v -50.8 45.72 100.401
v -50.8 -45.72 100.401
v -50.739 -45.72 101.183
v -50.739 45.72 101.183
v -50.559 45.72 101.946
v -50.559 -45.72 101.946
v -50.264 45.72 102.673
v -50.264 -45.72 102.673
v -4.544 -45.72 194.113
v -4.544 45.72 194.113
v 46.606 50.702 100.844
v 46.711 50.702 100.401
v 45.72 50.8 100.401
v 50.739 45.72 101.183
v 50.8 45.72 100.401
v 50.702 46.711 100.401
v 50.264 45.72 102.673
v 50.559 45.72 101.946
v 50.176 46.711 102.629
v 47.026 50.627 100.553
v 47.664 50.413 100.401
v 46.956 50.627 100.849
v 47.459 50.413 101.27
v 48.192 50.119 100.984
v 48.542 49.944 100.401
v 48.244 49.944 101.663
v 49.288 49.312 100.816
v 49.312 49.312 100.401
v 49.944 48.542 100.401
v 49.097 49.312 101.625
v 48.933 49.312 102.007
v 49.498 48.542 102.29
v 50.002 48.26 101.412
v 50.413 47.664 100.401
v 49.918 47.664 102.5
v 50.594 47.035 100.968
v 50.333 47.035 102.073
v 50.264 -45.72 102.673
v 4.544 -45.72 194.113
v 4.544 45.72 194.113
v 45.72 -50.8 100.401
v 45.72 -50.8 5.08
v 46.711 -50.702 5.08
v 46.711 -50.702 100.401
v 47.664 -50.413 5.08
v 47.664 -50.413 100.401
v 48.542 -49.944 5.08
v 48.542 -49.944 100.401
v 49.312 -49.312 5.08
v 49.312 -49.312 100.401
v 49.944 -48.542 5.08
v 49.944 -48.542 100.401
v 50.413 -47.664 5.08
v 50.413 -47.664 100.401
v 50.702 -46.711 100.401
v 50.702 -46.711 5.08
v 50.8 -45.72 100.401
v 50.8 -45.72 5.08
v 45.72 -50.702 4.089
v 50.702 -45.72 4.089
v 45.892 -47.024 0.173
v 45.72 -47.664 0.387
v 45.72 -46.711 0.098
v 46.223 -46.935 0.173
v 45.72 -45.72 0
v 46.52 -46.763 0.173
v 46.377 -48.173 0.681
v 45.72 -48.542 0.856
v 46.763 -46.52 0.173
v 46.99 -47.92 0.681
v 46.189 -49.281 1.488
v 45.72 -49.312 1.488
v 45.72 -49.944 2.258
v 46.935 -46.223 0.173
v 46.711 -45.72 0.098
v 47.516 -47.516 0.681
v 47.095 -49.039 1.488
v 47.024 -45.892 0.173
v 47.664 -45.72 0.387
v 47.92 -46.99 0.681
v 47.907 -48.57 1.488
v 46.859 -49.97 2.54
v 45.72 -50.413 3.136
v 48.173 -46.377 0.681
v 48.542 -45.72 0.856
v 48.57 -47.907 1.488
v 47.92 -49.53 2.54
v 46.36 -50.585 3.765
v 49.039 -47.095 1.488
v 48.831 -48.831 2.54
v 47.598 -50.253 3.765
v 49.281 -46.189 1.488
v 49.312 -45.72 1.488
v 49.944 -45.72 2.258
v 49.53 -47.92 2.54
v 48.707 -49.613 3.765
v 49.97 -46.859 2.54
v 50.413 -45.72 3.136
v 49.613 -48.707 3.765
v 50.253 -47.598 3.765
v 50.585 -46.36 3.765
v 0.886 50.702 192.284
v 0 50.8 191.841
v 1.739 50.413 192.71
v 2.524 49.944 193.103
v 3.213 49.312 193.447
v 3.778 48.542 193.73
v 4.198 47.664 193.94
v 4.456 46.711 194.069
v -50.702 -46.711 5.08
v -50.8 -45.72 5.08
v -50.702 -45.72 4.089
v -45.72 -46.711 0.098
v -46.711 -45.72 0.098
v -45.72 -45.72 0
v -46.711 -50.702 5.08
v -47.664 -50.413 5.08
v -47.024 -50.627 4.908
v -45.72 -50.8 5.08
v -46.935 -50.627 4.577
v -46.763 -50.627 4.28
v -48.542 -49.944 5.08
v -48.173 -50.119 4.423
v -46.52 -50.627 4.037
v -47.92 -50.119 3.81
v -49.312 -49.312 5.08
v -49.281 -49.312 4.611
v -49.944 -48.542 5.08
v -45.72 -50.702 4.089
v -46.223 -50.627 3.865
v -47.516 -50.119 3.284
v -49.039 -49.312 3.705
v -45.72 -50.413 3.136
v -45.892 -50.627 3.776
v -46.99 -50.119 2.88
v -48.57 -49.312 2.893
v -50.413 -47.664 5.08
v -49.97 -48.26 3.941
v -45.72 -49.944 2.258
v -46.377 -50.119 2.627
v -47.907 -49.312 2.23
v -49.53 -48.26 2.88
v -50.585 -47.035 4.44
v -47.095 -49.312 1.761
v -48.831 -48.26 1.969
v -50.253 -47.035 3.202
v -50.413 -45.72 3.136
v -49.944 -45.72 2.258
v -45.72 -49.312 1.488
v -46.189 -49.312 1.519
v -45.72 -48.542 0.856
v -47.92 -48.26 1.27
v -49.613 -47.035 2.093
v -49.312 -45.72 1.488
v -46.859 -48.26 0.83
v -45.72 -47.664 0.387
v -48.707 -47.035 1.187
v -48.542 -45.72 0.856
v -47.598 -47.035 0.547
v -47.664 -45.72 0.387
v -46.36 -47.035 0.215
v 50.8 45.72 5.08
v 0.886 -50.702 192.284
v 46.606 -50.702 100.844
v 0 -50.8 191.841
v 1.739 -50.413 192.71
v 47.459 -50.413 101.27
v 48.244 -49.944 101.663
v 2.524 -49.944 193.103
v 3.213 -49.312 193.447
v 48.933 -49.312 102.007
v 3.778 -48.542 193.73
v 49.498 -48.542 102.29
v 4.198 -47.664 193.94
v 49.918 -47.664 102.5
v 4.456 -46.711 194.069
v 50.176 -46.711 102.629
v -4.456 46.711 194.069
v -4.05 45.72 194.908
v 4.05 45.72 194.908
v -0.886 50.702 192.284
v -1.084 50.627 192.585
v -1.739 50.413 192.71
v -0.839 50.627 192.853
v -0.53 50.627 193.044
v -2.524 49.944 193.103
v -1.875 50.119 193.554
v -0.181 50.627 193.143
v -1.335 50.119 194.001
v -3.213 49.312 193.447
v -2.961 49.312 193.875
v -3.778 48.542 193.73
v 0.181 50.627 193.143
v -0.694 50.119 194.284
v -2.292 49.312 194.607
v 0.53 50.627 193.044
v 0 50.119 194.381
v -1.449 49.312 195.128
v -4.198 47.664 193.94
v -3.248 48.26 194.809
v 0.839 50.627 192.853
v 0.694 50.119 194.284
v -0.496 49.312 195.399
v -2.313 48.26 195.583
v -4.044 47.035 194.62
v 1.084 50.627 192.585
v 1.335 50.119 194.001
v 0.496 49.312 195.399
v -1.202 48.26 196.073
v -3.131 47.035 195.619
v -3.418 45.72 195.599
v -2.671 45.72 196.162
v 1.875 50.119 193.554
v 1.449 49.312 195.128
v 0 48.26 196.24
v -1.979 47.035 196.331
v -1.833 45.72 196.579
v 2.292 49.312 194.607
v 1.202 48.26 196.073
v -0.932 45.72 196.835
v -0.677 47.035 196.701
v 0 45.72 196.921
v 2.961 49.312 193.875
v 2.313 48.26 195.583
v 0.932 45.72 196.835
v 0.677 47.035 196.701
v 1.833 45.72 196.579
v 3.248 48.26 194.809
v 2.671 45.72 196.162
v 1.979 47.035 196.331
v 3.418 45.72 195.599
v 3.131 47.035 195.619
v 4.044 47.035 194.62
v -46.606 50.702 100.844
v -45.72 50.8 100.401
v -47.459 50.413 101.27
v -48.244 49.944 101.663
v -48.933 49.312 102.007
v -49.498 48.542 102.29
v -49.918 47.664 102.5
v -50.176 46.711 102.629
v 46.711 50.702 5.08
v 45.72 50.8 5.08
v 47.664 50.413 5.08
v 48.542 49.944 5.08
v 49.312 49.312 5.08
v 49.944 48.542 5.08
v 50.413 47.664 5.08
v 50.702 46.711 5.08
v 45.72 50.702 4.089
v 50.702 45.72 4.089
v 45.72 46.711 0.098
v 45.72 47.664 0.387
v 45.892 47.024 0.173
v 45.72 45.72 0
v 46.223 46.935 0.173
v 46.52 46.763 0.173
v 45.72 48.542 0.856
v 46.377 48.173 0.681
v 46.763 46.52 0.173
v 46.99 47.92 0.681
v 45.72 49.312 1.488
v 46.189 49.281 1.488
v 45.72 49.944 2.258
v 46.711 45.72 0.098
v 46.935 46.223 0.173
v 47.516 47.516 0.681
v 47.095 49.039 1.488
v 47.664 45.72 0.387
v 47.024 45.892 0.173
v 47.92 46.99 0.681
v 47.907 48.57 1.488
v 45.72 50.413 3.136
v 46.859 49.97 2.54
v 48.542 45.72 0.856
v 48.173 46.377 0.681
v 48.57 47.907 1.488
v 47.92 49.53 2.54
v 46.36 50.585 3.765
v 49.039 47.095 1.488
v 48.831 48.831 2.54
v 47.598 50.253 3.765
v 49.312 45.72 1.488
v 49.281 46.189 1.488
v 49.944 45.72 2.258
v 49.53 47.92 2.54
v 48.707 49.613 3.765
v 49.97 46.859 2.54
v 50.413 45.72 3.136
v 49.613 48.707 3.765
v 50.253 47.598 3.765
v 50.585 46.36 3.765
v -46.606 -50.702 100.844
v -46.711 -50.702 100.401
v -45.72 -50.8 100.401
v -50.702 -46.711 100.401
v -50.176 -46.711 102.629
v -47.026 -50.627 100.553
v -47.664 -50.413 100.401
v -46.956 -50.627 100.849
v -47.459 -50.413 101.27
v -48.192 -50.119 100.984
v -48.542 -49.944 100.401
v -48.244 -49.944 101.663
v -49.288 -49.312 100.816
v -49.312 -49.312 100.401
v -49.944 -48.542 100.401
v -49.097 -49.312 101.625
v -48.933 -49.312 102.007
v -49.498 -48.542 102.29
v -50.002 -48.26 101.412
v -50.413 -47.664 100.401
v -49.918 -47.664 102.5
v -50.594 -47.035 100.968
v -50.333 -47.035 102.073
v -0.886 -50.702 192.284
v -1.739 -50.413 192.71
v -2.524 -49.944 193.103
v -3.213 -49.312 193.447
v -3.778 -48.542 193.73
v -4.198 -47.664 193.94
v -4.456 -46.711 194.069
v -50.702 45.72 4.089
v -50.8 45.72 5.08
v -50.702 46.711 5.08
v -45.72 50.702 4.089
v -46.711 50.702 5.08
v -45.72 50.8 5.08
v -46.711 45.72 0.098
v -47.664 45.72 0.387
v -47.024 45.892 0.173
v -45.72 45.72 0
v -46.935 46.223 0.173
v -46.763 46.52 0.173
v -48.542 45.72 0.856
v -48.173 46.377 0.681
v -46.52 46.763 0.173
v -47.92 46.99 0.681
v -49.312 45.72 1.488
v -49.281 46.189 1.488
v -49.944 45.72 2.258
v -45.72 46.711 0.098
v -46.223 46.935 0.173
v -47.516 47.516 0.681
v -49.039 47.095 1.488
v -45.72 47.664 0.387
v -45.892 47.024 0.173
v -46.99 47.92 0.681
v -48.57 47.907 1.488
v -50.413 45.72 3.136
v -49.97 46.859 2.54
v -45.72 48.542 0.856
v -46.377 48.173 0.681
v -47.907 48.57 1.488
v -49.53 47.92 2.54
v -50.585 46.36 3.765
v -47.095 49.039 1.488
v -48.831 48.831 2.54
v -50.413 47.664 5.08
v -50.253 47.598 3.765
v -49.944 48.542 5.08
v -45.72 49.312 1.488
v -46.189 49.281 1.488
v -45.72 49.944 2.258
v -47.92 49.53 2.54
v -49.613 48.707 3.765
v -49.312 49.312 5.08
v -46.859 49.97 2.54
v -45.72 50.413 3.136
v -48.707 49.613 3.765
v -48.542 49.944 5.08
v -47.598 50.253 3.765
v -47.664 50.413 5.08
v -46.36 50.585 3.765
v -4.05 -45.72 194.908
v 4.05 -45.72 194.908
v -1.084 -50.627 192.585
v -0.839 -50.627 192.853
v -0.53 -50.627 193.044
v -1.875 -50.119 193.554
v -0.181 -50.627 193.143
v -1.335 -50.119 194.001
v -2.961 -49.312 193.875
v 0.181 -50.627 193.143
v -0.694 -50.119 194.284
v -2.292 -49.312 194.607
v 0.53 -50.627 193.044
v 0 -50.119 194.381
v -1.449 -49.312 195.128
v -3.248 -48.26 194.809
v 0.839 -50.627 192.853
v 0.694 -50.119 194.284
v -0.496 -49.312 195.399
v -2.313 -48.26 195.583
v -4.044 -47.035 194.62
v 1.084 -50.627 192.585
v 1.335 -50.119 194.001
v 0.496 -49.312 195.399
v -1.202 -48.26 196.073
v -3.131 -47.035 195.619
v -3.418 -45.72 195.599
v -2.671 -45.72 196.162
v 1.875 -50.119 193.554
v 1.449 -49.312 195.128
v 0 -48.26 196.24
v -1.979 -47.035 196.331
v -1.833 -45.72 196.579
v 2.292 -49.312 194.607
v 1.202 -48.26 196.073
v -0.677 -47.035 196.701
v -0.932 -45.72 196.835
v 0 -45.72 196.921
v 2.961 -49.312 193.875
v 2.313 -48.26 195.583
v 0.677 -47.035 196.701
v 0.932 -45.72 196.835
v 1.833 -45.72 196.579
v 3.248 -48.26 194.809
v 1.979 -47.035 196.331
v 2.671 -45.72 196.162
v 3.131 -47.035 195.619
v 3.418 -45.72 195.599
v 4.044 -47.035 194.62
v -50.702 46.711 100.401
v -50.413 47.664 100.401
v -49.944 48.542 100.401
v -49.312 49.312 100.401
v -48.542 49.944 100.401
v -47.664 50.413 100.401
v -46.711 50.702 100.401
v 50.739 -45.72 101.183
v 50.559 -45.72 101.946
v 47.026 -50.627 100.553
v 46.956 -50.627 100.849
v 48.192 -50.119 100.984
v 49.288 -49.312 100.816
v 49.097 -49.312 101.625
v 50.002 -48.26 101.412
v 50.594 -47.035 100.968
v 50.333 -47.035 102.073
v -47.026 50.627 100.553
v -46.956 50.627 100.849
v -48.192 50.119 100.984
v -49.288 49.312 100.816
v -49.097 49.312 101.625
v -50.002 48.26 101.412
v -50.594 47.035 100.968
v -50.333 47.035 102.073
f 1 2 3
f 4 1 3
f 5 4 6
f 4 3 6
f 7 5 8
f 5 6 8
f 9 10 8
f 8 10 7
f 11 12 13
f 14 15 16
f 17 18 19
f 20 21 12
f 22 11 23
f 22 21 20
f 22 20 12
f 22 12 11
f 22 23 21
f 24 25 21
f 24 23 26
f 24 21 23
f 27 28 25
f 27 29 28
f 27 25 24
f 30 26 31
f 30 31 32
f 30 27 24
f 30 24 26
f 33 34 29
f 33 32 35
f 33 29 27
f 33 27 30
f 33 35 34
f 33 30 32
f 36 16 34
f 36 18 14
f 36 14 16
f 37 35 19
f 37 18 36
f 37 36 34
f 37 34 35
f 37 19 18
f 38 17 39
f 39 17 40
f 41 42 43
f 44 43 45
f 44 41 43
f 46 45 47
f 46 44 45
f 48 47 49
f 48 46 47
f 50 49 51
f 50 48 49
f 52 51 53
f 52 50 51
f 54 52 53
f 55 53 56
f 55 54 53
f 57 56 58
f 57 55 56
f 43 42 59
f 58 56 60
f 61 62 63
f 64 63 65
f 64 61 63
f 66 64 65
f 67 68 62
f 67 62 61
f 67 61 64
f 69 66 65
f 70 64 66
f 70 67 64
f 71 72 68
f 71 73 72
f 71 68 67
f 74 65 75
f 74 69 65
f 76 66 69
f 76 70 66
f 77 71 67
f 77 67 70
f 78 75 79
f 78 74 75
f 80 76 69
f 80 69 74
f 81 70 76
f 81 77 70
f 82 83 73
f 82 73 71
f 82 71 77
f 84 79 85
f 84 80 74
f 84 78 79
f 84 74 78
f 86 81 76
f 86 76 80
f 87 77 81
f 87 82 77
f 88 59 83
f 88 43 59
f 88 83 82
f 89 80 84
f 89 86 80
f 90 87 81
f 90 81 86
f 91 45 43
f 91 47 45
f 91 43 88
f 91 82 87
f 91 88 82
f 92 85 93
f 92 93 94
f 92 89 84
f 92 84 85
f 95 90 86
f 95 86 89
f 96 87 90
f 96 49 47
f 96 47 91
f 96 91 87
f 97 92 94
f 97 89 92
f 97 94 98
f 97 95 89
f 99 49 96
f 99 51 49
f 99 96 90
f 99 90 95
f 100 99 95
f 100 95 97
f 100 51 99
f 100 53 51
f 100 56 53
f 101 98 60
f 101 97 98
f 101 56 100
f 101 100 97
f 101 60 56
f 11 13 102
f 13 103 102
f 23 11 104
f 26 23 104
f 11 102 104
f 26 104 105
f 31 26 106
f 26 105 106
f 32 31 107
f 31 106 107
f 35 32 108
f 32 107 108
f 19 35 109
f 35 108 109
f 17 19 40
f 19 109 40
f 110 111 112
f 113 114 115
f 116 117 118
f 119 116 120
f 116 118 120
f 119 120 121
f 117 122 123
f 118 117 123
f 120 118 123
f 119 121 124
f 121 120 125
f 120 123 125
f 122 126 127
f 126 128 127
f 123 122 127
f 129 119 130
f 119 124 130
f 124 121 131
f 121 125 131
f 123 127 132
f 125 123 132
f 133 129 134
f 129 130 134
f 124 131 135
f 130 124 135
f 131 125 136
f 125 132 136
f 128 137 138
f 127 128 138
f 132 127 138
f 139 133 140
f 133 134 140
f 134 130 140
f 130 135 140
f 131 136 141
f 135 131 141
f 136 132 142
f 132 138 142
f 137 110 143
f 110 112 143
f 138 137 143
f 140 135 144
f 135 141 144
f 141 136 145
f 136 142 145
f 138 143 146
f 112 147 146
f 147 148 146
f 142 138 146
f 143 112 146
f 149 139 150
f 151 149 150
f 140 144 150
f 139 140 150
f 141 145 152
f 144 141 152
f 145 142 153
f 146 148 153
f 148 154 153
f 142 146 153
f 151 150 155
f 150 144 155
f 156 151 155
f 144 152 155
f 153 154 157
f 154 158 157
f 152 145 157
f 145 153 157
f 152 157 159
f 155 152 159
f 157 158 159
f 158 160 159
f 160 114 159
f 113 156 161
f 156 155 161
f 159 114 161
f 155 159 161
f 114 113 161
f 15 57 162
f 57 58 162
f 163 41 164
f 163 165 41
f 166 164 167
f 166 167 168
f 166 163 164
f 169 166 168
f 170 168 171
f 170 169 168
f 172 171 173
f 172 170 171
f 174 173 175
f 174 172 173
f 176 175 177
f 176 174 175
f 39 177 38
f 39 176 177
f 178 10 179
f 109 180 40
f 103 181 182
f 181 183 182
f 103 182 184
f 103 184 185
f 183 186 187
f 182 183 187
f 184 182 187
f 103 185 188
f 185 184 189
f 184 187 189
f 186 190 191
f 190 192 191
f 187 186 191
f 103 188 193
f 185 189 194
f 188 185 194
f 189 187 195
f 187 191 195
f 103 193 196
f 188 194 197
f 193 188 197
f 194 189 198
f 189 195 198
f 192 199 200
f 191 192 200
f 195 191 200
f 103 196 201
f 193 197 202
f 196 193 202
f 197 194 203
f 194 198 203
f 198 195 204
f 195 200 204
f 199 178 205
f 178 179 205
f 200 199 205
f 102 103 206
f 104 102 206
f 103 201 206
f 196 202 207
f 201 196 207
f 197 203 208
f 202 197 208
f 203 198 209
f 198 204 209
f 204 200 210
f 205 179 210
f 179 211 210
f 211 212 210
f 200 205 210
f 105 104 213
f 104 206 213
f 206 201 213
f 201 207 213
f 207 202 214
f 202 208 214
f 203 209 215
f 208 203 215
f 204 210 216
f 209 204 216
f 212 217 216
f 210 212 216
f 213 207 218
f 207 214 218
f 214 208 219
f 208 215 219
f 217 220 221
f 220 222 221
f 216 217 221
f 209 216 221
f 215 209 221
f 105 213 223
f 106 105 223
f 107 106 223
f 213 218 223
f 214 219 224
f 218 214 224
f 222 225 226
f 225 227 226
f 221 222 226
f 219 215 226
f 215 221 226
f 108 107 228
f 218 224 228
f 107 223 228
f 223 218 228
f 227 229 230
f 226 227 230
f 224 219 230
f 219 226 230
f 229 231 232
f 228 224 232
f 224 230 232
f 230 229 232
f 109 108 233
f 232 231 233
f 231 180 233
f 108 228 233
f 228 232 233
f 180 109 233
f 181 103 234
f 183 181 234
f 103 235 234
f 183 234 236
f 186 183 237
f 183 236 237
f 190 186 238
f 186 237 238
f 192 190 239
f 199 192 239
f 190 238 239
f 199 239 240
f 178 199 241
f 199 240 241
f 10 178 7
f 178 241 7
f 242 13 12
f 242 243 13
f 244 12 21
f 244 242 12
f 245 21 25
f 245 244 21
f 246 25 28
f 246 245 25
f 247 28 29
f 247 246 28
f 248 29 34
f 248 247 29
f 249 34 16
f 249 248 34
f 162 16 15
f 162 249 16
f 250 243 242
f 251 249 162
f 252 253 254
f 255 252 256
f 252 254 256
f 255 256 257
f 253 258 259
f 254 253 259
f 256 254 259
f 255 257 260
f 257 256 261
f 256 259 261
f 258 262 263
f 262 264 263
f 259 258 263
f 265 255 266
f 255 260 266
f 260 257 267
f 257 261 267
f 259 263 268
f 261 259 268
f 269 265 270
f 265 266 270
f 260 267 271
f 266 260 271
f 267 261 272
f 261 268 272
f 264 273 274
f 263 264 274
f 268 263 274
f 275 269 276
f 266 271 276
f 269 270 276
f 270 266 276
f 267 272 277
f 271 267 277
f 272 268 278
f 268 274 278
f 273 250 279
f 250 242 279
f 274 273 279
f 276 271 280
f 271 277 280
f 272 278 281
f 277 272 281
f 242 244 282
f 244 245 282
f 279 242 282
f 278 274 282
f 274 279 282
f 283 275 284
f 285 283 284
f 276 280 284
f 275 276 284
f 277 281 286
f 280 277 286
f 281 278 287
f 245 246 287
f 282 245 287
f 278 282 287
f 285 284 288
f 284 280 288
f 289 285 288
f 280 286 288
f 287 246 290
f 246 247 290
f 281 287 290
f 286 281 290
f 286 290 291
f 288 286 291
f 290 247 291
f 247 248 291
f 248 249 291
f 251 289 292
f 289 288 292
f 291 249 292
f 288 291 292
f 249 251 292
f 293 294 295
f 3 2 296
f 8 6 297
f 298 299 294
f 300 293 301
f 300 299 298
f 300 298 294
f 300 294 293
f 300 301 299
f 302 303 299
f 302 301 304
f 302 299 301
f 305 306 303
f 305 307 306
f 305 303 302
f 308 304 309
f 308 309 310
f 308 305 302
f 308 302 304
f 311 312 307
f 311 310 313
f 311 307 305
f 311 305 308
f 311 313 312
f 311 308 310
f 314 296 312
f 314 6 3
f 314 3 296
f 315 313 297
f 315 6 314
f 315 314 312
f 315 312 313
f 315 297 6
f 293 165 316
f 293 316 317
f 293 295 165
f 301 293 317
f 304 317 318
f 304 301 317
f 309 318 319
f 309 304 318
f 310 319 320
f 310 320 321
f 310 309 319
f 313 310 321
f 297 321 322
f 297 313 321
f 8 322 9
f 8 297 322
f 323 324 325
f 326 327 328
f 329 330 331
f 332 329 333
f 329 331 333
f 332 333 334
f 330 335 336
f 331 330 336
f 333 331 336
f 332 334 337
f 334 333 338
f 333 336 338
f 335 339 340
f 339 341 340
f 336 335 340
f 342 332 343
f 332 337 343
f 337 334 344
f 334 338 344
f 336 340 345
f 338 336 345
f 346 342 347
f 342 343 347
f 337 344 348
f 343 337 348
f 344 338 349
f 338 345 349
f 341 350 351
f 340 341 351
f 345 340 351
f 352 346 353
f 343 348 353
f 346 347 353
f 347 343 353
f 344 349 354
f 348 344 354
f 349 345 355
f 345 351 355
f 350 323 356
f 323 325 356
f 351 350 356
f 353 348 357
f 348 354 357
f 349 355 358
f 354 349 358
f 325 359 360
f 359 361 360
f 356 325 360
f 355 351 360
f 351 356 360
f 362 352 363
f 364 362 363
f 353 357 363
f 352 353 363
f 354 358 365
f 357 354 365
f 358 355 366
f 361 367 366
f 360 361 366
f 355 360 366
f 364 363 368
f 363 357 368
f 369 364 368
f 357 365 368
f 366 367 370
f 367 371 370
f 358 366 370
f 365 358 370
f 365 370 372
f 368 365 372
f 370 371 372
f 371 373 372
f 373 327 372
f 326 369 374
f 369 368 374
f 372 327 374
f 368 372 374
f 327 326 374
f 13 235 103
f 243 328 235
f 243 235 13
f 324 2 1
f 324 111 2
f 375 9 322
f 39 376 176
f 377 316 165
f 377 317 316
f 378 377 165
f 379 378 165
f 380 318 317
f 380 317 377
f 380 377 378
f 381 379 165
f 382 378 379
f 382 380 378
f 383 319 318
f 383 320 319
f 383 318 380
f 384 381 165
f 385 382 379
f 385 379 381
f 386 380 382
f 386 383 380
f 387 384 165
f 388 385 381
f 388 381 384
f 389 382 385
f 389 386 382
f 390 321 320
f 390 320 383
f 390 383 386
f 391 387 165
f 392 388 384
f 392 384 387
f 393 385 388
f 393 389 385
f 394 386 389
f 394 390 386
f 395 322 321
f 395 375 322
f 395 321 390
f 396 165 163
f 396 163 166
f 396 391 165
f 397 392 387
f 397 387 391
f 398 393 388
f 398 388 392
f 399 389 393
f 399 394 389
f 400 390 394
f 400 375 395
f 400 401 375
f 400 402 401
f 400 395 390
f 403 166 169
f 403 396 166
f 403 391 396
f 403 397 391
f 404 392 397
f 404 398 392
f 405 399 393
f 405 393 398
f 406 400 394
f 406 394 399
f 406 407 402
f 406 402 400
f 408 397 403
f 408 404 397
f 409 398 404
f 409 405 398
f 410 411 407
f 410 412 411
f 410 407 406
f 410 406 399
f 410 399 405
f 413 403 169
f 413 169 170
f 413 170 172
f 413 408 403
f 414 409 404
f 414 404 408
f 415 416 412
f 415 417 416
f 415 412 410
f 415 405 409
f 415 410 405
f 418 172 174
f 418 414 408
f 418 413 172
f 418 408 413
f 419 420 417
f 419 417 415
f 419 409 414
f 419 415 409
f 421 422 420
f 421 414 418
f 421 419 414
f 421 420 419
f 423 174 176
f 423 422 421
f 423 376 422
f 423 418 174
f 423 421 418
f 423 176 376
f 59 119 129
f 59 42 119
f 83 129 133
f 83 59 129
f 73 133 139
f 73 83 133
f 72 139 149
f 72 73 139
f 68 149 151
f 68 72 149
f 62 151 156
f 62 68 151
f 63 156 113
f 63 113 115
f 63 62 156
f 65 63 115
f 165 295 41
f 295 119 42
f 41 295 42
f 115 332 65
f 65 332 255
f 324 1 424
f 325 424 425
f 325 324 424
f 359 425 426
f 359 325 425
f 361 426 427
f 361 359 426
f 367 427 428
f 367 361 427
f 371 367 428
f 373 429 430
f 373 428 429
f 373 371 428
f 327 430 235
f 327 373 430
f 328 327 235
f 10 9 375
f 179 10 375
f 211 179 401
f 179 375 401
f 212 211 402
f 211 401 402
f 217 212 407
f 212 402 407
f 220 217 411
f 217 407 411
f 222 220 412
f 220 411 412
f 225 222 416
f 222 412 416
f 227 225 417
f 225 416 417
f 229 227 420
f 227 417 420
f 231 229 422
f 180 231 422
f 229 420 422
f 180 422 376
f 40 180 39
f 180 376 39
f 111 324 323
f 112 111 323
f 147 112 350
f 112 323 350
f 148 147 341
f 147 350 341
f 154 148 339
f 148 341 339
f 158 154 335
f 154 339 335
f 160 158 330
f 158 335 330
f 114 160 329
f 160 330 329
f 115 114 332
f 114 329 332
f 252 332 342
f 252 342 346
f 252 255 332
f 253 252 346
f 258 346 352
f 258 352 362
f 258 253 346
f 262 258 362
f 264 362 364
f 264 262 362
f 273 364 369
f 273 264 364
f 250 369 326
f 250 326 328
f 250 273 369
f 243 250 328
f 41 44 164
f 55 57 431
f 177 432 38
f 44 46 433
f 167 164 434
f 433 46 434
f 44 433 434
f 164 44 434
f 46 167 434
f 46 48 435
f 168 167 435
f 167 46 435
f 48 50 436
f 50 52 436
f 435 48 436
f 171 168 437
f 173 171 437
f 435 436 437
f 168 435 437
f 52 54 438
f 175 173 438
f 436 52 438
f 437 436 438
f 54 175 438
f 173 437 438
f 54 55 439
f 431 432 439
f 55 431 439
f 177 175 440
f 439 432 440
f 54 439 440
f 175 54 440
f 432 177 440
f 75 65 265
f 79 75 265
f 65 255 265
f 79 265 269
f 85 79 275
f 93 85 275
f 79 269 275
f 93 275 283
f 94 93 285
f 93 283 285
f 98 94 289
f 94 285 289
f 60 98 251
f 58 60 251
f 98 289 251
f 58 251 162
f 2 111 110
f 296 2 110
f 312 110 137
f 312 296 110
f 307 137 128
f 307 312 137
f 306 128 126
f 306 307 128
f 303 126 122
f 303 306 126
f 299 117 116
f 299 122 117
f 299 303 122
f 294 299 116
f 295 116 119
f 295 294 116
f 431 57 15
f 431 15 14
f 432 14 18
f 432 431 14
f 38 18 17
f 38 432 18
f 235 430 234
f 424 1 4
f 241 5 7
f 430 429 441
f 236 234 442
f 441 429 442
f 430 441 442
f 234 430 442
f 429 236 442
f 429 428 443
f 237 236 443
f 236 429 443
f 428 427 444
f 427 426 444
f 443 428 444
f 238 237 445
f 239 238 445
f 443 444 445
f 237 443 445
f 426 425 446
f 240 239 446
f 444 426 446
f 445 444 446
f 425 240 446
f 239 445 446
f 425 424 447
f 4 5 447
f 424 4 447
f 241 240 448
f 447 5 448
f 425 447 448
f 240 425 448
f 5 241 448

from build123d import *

# Parameters (mm, degrees)
F0_W     = 101.6
F0_H     = 101.6
F1_DEPTH = 101.6
F2_W     = 101.6
F2_H     = 101.6
F3_DEPTH = 101.6
F5_DEPTH = 101.6
F6_R     = 5.08


with BuildPart() as f1:
    # F0 (on Top) → F1 (new body)
    with BuildSketch(Plane.XY):
        Rectangle(F0_W, F0_H)
    extrude(amount=F1_DEPTH)

    # F2 (on face) → F3 (join)
    with BuildSketch(Plane.XY.offset(101.6)):
        Rectangle(F2_W, F2_H)
    extrude(amount=F3_DEPTH)

    # F4 (on face) → F5 (cut)
    with BuildSketch(Plane(origin=(0, 50.8, 0), x_dir=(-1, 0, 0), z_dir=(0, 1, 0))):
        Polygon((-50.8, 101.6), (0, 203.2), (-50.8, 203.2), align=None)
        Polygon((50.8, 203.2), (0, 203.2), (50.8, 101.6), align=None)
    extrude(amount=-F5_DEPTH, mode=Mode.SUBTRACT)

    # F6
    f6_edges = [f1.edges().sort_by_distance(p)[0] for p in [
        (25.4, 50.8, 152.4),
        (50.8, 0, 101.6),
        (50.8, 50.8, 50.8),
        (0, 0, 203.2),
        (-50.8, 0, 101.6),
        (-50.8, 50.8, 50.8),
        (-50.8, 0, 0),
        (0, 50.8, 0),
        (-50.8, -50.8, 50.8),
        (50.8, -50.8, 50.8),
        (-25.4, -50.8, 152.4),
        (-25.4, 50.8, 152.4),
        (0, -50.8, 0),
        (50.8, 0, 0),
        (25.4, -50.8, 152.4),
    ]]
    fillet(f6_edges, radius=F6_R)


solid = f1.part
